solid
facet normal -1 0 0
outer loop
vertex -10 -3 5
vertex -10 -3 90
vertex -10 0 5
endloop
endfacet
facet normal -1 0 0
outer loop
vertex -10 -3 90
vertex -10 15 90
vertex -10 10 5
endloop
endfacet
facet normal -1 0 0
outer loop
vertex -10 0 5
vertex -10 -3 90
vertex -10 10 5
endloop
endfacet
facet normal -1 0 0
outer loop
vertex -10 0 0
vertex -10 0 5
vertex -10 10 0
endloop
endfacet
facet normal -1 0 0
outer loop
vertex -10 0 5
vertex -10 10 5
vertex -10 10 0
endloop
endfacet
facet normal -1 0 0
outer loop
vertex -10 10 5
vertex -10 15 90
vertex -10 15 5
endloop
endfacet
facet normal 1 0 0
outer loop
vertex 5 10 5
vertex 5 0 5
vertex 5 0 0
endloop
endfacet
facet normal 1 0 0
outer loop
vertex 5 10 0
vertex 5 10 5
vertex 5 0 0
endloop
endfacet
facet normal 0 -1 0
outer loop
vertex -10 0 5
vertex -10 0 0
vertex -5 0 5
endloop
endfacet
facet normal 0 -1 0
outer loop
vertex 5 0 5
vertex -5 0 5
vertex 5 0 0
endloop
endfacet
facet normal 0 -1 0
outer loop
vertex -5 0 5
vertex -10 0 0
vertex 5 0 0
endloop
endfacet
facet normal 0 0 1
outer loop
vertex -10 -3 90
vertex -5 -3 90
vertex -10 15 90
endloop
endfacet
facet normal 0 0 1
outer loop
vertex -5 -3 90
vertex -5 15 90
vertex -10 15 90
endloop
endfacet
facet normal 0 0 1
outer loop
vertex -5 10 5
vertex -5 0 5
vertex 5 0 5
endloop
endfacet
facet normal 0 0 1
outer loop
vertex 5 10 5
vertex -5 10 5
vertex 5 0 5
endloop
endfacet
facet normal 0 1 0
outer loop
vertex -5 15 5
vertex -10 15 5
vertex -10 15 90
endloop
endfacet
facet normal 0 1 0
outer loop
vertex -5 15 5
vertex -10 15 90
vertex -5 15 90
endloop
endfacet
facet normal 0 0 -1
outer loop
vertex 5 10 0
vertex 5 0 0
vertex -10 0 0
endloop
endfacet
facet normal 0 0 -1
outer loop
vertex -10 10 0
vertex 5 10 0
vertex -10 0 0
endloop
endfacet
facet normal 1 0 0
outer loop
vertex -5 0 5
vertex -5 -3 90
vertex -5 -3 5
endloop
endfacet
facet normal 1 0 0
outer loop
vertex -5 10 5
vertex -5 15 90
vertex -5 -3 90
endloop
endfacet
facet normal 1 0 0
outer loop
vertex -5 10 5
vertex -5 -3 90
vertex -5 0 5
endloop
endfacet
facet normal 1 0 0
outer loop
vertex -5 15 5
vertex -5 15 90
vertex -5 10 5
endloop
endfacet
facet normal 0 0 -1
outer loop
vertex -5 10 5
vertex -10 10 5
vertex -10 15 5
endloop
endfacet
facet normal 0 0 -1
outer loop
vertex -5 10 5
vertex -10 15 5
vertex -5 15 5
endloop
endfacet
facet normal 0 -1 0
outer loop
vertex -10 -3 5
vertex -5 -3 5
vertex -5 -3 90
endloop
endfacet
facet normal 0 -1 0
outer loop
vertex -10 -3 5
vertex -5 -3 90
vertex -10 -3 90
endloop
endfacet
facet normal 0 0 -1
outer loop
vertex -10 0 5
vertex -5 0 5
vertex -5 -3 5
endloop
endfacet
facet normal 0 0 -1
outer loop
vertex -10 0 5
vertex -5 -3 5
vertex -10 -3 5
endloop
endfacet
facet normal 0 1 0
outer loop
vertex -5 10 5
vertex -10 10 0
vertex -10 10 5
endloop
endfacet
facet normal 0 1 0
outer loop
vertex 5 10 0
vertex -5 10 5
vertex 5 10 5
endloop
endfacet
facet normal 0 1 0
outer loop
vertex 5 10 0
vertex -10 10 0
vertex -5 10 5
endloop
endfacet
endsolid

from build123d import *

# Parameters (mm, degrees)
BOSS_EXTRUDE1_DEPTH = 10
SKETCH3_W           = 5
SKETCH3_H           = 85
BOSS_EXTRUDE2_DEPTH = 5
SKETCH5_W           = 5
SKETCH5_H           = 85
BOSS_EXTRUDE4_DEPTH = 3


with BuildPart() as part:
    # Sketch1 → Boss-Extrude1 (new body)
    with BuildSketch(Plane(origin=(0, 0, 0), x_dir=(1, 0, 0), z_dir=(0, 1, 0))):
        Polygon((0, 0), (-10, 0), (-10, -90), (-5, -90), (-5, -5), (0, -5), (5, -5), (5, 0), align=None)
    extrude(amount=BOSS_EXTRUDE1_DEPTH)

    # Sketch3 → Boss-Extrude2 (add)
    with BuildSketch(Plane(origin=(0, 10, 0), x_dir=(1, 0, 0), z_dir=(0, 1, 0))):
        with Locations((-7.5, -47.5)):
            Rectangle(SKETCH3_W, SKETCH3_H)
    extrude(amount=BOSS_EXTRUDE2_DEPTH)

    # Sketch5 → Boss-Extrude4 (add)
    with BuildSketch(Plane(origin=(0, 0, 0), x_dir=(-1, 0, 0), z_dir=(0, -1, 0))):
        with Locations((7.5, -47.5)):
            Rectangle(SKETCH5_W, SKETCH5_H)
    extrude(amount=BOSS_EXTRUDE4_DEPTH)


solid = part.part
